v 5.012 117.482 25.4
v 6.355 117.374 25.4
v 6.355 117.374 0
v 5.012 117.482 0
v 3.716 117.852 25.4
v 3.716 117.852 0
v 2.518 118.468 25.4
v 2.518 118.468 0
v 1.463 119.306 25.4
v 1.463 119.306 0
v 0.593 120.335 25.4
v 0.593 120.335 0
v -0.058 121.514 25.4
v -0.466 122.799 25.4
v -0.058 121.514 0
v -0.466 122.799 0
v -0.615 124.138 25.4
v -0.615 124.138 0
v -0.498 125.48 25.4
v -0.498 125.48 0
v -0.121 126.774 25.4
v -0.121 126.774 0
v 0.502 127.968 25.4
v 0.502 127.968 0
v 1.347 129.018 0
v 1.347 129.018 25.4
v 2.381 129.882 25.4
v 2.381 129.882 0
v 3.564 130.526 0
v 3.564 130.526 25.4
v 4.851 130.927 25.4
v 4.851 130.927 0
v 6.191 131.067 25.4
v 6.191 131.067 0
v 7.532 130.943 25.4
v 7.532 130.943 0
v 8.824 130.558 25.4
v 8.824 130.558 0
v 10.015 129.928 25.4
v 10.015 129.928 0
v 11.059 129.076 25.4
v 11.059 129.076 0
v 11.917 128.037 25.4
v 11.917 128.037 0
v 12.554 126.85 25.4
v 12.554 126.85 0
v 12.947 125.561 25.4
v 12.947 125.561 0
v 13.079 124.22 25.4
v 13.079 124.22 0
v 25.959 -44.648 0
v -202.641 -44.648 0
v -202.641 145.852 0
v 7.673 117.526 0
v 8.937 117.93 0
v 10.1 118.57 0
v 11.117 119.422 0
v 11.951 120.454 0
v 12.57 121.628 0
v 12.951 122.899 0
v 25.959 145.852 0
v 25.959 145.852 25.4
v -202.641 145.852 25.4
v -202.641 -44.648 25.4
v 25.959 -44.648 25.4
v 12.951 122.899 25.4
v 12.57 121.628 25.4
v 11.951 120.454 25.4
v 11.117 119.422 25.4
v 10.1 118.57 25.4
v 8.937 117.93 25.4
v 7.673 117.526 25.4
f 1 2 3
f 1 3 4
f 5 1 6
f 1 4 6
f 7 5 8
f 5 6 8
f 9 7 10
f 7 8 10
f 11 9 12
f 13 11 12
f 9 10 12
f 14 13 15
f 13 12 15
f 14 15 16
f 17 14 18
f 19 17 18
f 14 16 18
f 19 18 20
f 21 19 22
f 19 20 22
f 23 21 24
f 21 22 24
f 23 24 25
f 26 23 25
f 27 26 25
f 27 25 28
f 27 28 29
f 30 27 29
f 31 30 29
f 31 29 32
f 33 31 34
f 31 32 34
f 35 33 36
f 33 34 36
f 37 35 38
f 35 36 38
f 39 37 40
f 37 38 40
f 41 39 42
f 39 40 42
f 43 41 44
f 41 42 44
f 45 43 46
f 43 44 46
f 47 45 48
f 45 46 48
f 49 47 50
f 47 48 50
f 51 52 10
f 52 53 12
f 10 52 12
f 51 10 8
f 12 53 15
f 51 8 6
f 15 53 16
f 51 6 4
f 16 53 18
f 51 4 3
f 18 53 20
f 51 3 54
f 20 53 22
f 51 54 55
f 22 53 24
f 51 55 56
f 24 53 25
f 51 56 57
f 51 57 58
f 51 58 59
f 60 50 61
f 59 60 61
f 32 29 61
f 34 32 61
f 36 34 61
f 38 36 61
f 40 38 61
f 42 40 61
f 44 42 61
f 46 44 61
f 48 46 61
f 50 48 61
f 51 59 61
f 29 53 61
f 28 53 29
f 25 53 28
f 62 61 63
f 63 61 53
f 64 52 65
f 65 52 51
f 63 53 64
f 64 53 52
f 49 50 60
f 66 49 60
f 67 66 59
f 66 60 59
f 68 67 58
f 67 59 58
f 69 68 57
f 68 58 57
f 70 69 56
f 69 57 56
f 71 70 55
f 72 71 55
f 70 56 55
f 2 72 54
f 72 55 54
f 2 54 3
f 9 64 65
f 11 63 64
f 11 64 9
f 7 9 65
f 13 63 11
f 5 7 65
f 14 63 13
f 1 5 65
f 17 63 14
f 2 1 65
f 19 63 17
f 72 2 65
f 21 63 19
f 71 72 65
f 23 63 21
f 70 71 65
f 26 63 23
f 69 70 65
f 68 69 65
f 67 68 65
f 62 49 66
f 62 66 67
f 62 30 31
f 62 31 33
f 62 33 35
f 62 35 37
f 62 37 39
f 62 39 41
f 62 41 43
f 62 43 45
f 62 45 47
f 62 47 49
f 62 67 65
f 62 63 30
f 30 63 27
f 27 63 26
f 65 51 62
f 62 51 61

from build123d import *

# Parameters (mm, degrees)
F1_DEPTH = 25.4


with BuildPart() as f1:
    # F0 (on Top) → F1 (new body)
    with BuildSketch(Plane.XY):
        with BuildLine():
            Line((9.274333, -44.647821), (25.95889, -44.647821))
            Line((25.95889, -44.647821), (25.95889, 124.220066))
            Line((25.95889, 124.220066), (13.079206, 124.220066))
            ThreePointArc((13.079206, 124.220066), (11.117097, 119.422112), (6.355267, 117.373893))
            Line((6.355267, 117.373893), (9.274333, -44.647821))
        make_face()
        with BuildLine():
            Line((-202.64111, -44.647821), (9.274333, -44.647821))
            Line((9.274333, -44.647821), (6.355267, 117.373893))
            ThreePointArc((6.355267, 117.373893), (1.346748, 129.018019), (13.079206, 124.220066))
            Line((13.079206, 124.220066), (25.95889, 124.220066))
            Line((25.95889, 124.220066), (25.95889, 145.852179))
            Line((25.95889, 145.852179), (-202.64111, 145.852179))
            Line((-202.64111, 145.852179), (-202.64111, -44.647821))
        make_face()
    extrude(amount=F1_DEPTH)


solid = f1.part
